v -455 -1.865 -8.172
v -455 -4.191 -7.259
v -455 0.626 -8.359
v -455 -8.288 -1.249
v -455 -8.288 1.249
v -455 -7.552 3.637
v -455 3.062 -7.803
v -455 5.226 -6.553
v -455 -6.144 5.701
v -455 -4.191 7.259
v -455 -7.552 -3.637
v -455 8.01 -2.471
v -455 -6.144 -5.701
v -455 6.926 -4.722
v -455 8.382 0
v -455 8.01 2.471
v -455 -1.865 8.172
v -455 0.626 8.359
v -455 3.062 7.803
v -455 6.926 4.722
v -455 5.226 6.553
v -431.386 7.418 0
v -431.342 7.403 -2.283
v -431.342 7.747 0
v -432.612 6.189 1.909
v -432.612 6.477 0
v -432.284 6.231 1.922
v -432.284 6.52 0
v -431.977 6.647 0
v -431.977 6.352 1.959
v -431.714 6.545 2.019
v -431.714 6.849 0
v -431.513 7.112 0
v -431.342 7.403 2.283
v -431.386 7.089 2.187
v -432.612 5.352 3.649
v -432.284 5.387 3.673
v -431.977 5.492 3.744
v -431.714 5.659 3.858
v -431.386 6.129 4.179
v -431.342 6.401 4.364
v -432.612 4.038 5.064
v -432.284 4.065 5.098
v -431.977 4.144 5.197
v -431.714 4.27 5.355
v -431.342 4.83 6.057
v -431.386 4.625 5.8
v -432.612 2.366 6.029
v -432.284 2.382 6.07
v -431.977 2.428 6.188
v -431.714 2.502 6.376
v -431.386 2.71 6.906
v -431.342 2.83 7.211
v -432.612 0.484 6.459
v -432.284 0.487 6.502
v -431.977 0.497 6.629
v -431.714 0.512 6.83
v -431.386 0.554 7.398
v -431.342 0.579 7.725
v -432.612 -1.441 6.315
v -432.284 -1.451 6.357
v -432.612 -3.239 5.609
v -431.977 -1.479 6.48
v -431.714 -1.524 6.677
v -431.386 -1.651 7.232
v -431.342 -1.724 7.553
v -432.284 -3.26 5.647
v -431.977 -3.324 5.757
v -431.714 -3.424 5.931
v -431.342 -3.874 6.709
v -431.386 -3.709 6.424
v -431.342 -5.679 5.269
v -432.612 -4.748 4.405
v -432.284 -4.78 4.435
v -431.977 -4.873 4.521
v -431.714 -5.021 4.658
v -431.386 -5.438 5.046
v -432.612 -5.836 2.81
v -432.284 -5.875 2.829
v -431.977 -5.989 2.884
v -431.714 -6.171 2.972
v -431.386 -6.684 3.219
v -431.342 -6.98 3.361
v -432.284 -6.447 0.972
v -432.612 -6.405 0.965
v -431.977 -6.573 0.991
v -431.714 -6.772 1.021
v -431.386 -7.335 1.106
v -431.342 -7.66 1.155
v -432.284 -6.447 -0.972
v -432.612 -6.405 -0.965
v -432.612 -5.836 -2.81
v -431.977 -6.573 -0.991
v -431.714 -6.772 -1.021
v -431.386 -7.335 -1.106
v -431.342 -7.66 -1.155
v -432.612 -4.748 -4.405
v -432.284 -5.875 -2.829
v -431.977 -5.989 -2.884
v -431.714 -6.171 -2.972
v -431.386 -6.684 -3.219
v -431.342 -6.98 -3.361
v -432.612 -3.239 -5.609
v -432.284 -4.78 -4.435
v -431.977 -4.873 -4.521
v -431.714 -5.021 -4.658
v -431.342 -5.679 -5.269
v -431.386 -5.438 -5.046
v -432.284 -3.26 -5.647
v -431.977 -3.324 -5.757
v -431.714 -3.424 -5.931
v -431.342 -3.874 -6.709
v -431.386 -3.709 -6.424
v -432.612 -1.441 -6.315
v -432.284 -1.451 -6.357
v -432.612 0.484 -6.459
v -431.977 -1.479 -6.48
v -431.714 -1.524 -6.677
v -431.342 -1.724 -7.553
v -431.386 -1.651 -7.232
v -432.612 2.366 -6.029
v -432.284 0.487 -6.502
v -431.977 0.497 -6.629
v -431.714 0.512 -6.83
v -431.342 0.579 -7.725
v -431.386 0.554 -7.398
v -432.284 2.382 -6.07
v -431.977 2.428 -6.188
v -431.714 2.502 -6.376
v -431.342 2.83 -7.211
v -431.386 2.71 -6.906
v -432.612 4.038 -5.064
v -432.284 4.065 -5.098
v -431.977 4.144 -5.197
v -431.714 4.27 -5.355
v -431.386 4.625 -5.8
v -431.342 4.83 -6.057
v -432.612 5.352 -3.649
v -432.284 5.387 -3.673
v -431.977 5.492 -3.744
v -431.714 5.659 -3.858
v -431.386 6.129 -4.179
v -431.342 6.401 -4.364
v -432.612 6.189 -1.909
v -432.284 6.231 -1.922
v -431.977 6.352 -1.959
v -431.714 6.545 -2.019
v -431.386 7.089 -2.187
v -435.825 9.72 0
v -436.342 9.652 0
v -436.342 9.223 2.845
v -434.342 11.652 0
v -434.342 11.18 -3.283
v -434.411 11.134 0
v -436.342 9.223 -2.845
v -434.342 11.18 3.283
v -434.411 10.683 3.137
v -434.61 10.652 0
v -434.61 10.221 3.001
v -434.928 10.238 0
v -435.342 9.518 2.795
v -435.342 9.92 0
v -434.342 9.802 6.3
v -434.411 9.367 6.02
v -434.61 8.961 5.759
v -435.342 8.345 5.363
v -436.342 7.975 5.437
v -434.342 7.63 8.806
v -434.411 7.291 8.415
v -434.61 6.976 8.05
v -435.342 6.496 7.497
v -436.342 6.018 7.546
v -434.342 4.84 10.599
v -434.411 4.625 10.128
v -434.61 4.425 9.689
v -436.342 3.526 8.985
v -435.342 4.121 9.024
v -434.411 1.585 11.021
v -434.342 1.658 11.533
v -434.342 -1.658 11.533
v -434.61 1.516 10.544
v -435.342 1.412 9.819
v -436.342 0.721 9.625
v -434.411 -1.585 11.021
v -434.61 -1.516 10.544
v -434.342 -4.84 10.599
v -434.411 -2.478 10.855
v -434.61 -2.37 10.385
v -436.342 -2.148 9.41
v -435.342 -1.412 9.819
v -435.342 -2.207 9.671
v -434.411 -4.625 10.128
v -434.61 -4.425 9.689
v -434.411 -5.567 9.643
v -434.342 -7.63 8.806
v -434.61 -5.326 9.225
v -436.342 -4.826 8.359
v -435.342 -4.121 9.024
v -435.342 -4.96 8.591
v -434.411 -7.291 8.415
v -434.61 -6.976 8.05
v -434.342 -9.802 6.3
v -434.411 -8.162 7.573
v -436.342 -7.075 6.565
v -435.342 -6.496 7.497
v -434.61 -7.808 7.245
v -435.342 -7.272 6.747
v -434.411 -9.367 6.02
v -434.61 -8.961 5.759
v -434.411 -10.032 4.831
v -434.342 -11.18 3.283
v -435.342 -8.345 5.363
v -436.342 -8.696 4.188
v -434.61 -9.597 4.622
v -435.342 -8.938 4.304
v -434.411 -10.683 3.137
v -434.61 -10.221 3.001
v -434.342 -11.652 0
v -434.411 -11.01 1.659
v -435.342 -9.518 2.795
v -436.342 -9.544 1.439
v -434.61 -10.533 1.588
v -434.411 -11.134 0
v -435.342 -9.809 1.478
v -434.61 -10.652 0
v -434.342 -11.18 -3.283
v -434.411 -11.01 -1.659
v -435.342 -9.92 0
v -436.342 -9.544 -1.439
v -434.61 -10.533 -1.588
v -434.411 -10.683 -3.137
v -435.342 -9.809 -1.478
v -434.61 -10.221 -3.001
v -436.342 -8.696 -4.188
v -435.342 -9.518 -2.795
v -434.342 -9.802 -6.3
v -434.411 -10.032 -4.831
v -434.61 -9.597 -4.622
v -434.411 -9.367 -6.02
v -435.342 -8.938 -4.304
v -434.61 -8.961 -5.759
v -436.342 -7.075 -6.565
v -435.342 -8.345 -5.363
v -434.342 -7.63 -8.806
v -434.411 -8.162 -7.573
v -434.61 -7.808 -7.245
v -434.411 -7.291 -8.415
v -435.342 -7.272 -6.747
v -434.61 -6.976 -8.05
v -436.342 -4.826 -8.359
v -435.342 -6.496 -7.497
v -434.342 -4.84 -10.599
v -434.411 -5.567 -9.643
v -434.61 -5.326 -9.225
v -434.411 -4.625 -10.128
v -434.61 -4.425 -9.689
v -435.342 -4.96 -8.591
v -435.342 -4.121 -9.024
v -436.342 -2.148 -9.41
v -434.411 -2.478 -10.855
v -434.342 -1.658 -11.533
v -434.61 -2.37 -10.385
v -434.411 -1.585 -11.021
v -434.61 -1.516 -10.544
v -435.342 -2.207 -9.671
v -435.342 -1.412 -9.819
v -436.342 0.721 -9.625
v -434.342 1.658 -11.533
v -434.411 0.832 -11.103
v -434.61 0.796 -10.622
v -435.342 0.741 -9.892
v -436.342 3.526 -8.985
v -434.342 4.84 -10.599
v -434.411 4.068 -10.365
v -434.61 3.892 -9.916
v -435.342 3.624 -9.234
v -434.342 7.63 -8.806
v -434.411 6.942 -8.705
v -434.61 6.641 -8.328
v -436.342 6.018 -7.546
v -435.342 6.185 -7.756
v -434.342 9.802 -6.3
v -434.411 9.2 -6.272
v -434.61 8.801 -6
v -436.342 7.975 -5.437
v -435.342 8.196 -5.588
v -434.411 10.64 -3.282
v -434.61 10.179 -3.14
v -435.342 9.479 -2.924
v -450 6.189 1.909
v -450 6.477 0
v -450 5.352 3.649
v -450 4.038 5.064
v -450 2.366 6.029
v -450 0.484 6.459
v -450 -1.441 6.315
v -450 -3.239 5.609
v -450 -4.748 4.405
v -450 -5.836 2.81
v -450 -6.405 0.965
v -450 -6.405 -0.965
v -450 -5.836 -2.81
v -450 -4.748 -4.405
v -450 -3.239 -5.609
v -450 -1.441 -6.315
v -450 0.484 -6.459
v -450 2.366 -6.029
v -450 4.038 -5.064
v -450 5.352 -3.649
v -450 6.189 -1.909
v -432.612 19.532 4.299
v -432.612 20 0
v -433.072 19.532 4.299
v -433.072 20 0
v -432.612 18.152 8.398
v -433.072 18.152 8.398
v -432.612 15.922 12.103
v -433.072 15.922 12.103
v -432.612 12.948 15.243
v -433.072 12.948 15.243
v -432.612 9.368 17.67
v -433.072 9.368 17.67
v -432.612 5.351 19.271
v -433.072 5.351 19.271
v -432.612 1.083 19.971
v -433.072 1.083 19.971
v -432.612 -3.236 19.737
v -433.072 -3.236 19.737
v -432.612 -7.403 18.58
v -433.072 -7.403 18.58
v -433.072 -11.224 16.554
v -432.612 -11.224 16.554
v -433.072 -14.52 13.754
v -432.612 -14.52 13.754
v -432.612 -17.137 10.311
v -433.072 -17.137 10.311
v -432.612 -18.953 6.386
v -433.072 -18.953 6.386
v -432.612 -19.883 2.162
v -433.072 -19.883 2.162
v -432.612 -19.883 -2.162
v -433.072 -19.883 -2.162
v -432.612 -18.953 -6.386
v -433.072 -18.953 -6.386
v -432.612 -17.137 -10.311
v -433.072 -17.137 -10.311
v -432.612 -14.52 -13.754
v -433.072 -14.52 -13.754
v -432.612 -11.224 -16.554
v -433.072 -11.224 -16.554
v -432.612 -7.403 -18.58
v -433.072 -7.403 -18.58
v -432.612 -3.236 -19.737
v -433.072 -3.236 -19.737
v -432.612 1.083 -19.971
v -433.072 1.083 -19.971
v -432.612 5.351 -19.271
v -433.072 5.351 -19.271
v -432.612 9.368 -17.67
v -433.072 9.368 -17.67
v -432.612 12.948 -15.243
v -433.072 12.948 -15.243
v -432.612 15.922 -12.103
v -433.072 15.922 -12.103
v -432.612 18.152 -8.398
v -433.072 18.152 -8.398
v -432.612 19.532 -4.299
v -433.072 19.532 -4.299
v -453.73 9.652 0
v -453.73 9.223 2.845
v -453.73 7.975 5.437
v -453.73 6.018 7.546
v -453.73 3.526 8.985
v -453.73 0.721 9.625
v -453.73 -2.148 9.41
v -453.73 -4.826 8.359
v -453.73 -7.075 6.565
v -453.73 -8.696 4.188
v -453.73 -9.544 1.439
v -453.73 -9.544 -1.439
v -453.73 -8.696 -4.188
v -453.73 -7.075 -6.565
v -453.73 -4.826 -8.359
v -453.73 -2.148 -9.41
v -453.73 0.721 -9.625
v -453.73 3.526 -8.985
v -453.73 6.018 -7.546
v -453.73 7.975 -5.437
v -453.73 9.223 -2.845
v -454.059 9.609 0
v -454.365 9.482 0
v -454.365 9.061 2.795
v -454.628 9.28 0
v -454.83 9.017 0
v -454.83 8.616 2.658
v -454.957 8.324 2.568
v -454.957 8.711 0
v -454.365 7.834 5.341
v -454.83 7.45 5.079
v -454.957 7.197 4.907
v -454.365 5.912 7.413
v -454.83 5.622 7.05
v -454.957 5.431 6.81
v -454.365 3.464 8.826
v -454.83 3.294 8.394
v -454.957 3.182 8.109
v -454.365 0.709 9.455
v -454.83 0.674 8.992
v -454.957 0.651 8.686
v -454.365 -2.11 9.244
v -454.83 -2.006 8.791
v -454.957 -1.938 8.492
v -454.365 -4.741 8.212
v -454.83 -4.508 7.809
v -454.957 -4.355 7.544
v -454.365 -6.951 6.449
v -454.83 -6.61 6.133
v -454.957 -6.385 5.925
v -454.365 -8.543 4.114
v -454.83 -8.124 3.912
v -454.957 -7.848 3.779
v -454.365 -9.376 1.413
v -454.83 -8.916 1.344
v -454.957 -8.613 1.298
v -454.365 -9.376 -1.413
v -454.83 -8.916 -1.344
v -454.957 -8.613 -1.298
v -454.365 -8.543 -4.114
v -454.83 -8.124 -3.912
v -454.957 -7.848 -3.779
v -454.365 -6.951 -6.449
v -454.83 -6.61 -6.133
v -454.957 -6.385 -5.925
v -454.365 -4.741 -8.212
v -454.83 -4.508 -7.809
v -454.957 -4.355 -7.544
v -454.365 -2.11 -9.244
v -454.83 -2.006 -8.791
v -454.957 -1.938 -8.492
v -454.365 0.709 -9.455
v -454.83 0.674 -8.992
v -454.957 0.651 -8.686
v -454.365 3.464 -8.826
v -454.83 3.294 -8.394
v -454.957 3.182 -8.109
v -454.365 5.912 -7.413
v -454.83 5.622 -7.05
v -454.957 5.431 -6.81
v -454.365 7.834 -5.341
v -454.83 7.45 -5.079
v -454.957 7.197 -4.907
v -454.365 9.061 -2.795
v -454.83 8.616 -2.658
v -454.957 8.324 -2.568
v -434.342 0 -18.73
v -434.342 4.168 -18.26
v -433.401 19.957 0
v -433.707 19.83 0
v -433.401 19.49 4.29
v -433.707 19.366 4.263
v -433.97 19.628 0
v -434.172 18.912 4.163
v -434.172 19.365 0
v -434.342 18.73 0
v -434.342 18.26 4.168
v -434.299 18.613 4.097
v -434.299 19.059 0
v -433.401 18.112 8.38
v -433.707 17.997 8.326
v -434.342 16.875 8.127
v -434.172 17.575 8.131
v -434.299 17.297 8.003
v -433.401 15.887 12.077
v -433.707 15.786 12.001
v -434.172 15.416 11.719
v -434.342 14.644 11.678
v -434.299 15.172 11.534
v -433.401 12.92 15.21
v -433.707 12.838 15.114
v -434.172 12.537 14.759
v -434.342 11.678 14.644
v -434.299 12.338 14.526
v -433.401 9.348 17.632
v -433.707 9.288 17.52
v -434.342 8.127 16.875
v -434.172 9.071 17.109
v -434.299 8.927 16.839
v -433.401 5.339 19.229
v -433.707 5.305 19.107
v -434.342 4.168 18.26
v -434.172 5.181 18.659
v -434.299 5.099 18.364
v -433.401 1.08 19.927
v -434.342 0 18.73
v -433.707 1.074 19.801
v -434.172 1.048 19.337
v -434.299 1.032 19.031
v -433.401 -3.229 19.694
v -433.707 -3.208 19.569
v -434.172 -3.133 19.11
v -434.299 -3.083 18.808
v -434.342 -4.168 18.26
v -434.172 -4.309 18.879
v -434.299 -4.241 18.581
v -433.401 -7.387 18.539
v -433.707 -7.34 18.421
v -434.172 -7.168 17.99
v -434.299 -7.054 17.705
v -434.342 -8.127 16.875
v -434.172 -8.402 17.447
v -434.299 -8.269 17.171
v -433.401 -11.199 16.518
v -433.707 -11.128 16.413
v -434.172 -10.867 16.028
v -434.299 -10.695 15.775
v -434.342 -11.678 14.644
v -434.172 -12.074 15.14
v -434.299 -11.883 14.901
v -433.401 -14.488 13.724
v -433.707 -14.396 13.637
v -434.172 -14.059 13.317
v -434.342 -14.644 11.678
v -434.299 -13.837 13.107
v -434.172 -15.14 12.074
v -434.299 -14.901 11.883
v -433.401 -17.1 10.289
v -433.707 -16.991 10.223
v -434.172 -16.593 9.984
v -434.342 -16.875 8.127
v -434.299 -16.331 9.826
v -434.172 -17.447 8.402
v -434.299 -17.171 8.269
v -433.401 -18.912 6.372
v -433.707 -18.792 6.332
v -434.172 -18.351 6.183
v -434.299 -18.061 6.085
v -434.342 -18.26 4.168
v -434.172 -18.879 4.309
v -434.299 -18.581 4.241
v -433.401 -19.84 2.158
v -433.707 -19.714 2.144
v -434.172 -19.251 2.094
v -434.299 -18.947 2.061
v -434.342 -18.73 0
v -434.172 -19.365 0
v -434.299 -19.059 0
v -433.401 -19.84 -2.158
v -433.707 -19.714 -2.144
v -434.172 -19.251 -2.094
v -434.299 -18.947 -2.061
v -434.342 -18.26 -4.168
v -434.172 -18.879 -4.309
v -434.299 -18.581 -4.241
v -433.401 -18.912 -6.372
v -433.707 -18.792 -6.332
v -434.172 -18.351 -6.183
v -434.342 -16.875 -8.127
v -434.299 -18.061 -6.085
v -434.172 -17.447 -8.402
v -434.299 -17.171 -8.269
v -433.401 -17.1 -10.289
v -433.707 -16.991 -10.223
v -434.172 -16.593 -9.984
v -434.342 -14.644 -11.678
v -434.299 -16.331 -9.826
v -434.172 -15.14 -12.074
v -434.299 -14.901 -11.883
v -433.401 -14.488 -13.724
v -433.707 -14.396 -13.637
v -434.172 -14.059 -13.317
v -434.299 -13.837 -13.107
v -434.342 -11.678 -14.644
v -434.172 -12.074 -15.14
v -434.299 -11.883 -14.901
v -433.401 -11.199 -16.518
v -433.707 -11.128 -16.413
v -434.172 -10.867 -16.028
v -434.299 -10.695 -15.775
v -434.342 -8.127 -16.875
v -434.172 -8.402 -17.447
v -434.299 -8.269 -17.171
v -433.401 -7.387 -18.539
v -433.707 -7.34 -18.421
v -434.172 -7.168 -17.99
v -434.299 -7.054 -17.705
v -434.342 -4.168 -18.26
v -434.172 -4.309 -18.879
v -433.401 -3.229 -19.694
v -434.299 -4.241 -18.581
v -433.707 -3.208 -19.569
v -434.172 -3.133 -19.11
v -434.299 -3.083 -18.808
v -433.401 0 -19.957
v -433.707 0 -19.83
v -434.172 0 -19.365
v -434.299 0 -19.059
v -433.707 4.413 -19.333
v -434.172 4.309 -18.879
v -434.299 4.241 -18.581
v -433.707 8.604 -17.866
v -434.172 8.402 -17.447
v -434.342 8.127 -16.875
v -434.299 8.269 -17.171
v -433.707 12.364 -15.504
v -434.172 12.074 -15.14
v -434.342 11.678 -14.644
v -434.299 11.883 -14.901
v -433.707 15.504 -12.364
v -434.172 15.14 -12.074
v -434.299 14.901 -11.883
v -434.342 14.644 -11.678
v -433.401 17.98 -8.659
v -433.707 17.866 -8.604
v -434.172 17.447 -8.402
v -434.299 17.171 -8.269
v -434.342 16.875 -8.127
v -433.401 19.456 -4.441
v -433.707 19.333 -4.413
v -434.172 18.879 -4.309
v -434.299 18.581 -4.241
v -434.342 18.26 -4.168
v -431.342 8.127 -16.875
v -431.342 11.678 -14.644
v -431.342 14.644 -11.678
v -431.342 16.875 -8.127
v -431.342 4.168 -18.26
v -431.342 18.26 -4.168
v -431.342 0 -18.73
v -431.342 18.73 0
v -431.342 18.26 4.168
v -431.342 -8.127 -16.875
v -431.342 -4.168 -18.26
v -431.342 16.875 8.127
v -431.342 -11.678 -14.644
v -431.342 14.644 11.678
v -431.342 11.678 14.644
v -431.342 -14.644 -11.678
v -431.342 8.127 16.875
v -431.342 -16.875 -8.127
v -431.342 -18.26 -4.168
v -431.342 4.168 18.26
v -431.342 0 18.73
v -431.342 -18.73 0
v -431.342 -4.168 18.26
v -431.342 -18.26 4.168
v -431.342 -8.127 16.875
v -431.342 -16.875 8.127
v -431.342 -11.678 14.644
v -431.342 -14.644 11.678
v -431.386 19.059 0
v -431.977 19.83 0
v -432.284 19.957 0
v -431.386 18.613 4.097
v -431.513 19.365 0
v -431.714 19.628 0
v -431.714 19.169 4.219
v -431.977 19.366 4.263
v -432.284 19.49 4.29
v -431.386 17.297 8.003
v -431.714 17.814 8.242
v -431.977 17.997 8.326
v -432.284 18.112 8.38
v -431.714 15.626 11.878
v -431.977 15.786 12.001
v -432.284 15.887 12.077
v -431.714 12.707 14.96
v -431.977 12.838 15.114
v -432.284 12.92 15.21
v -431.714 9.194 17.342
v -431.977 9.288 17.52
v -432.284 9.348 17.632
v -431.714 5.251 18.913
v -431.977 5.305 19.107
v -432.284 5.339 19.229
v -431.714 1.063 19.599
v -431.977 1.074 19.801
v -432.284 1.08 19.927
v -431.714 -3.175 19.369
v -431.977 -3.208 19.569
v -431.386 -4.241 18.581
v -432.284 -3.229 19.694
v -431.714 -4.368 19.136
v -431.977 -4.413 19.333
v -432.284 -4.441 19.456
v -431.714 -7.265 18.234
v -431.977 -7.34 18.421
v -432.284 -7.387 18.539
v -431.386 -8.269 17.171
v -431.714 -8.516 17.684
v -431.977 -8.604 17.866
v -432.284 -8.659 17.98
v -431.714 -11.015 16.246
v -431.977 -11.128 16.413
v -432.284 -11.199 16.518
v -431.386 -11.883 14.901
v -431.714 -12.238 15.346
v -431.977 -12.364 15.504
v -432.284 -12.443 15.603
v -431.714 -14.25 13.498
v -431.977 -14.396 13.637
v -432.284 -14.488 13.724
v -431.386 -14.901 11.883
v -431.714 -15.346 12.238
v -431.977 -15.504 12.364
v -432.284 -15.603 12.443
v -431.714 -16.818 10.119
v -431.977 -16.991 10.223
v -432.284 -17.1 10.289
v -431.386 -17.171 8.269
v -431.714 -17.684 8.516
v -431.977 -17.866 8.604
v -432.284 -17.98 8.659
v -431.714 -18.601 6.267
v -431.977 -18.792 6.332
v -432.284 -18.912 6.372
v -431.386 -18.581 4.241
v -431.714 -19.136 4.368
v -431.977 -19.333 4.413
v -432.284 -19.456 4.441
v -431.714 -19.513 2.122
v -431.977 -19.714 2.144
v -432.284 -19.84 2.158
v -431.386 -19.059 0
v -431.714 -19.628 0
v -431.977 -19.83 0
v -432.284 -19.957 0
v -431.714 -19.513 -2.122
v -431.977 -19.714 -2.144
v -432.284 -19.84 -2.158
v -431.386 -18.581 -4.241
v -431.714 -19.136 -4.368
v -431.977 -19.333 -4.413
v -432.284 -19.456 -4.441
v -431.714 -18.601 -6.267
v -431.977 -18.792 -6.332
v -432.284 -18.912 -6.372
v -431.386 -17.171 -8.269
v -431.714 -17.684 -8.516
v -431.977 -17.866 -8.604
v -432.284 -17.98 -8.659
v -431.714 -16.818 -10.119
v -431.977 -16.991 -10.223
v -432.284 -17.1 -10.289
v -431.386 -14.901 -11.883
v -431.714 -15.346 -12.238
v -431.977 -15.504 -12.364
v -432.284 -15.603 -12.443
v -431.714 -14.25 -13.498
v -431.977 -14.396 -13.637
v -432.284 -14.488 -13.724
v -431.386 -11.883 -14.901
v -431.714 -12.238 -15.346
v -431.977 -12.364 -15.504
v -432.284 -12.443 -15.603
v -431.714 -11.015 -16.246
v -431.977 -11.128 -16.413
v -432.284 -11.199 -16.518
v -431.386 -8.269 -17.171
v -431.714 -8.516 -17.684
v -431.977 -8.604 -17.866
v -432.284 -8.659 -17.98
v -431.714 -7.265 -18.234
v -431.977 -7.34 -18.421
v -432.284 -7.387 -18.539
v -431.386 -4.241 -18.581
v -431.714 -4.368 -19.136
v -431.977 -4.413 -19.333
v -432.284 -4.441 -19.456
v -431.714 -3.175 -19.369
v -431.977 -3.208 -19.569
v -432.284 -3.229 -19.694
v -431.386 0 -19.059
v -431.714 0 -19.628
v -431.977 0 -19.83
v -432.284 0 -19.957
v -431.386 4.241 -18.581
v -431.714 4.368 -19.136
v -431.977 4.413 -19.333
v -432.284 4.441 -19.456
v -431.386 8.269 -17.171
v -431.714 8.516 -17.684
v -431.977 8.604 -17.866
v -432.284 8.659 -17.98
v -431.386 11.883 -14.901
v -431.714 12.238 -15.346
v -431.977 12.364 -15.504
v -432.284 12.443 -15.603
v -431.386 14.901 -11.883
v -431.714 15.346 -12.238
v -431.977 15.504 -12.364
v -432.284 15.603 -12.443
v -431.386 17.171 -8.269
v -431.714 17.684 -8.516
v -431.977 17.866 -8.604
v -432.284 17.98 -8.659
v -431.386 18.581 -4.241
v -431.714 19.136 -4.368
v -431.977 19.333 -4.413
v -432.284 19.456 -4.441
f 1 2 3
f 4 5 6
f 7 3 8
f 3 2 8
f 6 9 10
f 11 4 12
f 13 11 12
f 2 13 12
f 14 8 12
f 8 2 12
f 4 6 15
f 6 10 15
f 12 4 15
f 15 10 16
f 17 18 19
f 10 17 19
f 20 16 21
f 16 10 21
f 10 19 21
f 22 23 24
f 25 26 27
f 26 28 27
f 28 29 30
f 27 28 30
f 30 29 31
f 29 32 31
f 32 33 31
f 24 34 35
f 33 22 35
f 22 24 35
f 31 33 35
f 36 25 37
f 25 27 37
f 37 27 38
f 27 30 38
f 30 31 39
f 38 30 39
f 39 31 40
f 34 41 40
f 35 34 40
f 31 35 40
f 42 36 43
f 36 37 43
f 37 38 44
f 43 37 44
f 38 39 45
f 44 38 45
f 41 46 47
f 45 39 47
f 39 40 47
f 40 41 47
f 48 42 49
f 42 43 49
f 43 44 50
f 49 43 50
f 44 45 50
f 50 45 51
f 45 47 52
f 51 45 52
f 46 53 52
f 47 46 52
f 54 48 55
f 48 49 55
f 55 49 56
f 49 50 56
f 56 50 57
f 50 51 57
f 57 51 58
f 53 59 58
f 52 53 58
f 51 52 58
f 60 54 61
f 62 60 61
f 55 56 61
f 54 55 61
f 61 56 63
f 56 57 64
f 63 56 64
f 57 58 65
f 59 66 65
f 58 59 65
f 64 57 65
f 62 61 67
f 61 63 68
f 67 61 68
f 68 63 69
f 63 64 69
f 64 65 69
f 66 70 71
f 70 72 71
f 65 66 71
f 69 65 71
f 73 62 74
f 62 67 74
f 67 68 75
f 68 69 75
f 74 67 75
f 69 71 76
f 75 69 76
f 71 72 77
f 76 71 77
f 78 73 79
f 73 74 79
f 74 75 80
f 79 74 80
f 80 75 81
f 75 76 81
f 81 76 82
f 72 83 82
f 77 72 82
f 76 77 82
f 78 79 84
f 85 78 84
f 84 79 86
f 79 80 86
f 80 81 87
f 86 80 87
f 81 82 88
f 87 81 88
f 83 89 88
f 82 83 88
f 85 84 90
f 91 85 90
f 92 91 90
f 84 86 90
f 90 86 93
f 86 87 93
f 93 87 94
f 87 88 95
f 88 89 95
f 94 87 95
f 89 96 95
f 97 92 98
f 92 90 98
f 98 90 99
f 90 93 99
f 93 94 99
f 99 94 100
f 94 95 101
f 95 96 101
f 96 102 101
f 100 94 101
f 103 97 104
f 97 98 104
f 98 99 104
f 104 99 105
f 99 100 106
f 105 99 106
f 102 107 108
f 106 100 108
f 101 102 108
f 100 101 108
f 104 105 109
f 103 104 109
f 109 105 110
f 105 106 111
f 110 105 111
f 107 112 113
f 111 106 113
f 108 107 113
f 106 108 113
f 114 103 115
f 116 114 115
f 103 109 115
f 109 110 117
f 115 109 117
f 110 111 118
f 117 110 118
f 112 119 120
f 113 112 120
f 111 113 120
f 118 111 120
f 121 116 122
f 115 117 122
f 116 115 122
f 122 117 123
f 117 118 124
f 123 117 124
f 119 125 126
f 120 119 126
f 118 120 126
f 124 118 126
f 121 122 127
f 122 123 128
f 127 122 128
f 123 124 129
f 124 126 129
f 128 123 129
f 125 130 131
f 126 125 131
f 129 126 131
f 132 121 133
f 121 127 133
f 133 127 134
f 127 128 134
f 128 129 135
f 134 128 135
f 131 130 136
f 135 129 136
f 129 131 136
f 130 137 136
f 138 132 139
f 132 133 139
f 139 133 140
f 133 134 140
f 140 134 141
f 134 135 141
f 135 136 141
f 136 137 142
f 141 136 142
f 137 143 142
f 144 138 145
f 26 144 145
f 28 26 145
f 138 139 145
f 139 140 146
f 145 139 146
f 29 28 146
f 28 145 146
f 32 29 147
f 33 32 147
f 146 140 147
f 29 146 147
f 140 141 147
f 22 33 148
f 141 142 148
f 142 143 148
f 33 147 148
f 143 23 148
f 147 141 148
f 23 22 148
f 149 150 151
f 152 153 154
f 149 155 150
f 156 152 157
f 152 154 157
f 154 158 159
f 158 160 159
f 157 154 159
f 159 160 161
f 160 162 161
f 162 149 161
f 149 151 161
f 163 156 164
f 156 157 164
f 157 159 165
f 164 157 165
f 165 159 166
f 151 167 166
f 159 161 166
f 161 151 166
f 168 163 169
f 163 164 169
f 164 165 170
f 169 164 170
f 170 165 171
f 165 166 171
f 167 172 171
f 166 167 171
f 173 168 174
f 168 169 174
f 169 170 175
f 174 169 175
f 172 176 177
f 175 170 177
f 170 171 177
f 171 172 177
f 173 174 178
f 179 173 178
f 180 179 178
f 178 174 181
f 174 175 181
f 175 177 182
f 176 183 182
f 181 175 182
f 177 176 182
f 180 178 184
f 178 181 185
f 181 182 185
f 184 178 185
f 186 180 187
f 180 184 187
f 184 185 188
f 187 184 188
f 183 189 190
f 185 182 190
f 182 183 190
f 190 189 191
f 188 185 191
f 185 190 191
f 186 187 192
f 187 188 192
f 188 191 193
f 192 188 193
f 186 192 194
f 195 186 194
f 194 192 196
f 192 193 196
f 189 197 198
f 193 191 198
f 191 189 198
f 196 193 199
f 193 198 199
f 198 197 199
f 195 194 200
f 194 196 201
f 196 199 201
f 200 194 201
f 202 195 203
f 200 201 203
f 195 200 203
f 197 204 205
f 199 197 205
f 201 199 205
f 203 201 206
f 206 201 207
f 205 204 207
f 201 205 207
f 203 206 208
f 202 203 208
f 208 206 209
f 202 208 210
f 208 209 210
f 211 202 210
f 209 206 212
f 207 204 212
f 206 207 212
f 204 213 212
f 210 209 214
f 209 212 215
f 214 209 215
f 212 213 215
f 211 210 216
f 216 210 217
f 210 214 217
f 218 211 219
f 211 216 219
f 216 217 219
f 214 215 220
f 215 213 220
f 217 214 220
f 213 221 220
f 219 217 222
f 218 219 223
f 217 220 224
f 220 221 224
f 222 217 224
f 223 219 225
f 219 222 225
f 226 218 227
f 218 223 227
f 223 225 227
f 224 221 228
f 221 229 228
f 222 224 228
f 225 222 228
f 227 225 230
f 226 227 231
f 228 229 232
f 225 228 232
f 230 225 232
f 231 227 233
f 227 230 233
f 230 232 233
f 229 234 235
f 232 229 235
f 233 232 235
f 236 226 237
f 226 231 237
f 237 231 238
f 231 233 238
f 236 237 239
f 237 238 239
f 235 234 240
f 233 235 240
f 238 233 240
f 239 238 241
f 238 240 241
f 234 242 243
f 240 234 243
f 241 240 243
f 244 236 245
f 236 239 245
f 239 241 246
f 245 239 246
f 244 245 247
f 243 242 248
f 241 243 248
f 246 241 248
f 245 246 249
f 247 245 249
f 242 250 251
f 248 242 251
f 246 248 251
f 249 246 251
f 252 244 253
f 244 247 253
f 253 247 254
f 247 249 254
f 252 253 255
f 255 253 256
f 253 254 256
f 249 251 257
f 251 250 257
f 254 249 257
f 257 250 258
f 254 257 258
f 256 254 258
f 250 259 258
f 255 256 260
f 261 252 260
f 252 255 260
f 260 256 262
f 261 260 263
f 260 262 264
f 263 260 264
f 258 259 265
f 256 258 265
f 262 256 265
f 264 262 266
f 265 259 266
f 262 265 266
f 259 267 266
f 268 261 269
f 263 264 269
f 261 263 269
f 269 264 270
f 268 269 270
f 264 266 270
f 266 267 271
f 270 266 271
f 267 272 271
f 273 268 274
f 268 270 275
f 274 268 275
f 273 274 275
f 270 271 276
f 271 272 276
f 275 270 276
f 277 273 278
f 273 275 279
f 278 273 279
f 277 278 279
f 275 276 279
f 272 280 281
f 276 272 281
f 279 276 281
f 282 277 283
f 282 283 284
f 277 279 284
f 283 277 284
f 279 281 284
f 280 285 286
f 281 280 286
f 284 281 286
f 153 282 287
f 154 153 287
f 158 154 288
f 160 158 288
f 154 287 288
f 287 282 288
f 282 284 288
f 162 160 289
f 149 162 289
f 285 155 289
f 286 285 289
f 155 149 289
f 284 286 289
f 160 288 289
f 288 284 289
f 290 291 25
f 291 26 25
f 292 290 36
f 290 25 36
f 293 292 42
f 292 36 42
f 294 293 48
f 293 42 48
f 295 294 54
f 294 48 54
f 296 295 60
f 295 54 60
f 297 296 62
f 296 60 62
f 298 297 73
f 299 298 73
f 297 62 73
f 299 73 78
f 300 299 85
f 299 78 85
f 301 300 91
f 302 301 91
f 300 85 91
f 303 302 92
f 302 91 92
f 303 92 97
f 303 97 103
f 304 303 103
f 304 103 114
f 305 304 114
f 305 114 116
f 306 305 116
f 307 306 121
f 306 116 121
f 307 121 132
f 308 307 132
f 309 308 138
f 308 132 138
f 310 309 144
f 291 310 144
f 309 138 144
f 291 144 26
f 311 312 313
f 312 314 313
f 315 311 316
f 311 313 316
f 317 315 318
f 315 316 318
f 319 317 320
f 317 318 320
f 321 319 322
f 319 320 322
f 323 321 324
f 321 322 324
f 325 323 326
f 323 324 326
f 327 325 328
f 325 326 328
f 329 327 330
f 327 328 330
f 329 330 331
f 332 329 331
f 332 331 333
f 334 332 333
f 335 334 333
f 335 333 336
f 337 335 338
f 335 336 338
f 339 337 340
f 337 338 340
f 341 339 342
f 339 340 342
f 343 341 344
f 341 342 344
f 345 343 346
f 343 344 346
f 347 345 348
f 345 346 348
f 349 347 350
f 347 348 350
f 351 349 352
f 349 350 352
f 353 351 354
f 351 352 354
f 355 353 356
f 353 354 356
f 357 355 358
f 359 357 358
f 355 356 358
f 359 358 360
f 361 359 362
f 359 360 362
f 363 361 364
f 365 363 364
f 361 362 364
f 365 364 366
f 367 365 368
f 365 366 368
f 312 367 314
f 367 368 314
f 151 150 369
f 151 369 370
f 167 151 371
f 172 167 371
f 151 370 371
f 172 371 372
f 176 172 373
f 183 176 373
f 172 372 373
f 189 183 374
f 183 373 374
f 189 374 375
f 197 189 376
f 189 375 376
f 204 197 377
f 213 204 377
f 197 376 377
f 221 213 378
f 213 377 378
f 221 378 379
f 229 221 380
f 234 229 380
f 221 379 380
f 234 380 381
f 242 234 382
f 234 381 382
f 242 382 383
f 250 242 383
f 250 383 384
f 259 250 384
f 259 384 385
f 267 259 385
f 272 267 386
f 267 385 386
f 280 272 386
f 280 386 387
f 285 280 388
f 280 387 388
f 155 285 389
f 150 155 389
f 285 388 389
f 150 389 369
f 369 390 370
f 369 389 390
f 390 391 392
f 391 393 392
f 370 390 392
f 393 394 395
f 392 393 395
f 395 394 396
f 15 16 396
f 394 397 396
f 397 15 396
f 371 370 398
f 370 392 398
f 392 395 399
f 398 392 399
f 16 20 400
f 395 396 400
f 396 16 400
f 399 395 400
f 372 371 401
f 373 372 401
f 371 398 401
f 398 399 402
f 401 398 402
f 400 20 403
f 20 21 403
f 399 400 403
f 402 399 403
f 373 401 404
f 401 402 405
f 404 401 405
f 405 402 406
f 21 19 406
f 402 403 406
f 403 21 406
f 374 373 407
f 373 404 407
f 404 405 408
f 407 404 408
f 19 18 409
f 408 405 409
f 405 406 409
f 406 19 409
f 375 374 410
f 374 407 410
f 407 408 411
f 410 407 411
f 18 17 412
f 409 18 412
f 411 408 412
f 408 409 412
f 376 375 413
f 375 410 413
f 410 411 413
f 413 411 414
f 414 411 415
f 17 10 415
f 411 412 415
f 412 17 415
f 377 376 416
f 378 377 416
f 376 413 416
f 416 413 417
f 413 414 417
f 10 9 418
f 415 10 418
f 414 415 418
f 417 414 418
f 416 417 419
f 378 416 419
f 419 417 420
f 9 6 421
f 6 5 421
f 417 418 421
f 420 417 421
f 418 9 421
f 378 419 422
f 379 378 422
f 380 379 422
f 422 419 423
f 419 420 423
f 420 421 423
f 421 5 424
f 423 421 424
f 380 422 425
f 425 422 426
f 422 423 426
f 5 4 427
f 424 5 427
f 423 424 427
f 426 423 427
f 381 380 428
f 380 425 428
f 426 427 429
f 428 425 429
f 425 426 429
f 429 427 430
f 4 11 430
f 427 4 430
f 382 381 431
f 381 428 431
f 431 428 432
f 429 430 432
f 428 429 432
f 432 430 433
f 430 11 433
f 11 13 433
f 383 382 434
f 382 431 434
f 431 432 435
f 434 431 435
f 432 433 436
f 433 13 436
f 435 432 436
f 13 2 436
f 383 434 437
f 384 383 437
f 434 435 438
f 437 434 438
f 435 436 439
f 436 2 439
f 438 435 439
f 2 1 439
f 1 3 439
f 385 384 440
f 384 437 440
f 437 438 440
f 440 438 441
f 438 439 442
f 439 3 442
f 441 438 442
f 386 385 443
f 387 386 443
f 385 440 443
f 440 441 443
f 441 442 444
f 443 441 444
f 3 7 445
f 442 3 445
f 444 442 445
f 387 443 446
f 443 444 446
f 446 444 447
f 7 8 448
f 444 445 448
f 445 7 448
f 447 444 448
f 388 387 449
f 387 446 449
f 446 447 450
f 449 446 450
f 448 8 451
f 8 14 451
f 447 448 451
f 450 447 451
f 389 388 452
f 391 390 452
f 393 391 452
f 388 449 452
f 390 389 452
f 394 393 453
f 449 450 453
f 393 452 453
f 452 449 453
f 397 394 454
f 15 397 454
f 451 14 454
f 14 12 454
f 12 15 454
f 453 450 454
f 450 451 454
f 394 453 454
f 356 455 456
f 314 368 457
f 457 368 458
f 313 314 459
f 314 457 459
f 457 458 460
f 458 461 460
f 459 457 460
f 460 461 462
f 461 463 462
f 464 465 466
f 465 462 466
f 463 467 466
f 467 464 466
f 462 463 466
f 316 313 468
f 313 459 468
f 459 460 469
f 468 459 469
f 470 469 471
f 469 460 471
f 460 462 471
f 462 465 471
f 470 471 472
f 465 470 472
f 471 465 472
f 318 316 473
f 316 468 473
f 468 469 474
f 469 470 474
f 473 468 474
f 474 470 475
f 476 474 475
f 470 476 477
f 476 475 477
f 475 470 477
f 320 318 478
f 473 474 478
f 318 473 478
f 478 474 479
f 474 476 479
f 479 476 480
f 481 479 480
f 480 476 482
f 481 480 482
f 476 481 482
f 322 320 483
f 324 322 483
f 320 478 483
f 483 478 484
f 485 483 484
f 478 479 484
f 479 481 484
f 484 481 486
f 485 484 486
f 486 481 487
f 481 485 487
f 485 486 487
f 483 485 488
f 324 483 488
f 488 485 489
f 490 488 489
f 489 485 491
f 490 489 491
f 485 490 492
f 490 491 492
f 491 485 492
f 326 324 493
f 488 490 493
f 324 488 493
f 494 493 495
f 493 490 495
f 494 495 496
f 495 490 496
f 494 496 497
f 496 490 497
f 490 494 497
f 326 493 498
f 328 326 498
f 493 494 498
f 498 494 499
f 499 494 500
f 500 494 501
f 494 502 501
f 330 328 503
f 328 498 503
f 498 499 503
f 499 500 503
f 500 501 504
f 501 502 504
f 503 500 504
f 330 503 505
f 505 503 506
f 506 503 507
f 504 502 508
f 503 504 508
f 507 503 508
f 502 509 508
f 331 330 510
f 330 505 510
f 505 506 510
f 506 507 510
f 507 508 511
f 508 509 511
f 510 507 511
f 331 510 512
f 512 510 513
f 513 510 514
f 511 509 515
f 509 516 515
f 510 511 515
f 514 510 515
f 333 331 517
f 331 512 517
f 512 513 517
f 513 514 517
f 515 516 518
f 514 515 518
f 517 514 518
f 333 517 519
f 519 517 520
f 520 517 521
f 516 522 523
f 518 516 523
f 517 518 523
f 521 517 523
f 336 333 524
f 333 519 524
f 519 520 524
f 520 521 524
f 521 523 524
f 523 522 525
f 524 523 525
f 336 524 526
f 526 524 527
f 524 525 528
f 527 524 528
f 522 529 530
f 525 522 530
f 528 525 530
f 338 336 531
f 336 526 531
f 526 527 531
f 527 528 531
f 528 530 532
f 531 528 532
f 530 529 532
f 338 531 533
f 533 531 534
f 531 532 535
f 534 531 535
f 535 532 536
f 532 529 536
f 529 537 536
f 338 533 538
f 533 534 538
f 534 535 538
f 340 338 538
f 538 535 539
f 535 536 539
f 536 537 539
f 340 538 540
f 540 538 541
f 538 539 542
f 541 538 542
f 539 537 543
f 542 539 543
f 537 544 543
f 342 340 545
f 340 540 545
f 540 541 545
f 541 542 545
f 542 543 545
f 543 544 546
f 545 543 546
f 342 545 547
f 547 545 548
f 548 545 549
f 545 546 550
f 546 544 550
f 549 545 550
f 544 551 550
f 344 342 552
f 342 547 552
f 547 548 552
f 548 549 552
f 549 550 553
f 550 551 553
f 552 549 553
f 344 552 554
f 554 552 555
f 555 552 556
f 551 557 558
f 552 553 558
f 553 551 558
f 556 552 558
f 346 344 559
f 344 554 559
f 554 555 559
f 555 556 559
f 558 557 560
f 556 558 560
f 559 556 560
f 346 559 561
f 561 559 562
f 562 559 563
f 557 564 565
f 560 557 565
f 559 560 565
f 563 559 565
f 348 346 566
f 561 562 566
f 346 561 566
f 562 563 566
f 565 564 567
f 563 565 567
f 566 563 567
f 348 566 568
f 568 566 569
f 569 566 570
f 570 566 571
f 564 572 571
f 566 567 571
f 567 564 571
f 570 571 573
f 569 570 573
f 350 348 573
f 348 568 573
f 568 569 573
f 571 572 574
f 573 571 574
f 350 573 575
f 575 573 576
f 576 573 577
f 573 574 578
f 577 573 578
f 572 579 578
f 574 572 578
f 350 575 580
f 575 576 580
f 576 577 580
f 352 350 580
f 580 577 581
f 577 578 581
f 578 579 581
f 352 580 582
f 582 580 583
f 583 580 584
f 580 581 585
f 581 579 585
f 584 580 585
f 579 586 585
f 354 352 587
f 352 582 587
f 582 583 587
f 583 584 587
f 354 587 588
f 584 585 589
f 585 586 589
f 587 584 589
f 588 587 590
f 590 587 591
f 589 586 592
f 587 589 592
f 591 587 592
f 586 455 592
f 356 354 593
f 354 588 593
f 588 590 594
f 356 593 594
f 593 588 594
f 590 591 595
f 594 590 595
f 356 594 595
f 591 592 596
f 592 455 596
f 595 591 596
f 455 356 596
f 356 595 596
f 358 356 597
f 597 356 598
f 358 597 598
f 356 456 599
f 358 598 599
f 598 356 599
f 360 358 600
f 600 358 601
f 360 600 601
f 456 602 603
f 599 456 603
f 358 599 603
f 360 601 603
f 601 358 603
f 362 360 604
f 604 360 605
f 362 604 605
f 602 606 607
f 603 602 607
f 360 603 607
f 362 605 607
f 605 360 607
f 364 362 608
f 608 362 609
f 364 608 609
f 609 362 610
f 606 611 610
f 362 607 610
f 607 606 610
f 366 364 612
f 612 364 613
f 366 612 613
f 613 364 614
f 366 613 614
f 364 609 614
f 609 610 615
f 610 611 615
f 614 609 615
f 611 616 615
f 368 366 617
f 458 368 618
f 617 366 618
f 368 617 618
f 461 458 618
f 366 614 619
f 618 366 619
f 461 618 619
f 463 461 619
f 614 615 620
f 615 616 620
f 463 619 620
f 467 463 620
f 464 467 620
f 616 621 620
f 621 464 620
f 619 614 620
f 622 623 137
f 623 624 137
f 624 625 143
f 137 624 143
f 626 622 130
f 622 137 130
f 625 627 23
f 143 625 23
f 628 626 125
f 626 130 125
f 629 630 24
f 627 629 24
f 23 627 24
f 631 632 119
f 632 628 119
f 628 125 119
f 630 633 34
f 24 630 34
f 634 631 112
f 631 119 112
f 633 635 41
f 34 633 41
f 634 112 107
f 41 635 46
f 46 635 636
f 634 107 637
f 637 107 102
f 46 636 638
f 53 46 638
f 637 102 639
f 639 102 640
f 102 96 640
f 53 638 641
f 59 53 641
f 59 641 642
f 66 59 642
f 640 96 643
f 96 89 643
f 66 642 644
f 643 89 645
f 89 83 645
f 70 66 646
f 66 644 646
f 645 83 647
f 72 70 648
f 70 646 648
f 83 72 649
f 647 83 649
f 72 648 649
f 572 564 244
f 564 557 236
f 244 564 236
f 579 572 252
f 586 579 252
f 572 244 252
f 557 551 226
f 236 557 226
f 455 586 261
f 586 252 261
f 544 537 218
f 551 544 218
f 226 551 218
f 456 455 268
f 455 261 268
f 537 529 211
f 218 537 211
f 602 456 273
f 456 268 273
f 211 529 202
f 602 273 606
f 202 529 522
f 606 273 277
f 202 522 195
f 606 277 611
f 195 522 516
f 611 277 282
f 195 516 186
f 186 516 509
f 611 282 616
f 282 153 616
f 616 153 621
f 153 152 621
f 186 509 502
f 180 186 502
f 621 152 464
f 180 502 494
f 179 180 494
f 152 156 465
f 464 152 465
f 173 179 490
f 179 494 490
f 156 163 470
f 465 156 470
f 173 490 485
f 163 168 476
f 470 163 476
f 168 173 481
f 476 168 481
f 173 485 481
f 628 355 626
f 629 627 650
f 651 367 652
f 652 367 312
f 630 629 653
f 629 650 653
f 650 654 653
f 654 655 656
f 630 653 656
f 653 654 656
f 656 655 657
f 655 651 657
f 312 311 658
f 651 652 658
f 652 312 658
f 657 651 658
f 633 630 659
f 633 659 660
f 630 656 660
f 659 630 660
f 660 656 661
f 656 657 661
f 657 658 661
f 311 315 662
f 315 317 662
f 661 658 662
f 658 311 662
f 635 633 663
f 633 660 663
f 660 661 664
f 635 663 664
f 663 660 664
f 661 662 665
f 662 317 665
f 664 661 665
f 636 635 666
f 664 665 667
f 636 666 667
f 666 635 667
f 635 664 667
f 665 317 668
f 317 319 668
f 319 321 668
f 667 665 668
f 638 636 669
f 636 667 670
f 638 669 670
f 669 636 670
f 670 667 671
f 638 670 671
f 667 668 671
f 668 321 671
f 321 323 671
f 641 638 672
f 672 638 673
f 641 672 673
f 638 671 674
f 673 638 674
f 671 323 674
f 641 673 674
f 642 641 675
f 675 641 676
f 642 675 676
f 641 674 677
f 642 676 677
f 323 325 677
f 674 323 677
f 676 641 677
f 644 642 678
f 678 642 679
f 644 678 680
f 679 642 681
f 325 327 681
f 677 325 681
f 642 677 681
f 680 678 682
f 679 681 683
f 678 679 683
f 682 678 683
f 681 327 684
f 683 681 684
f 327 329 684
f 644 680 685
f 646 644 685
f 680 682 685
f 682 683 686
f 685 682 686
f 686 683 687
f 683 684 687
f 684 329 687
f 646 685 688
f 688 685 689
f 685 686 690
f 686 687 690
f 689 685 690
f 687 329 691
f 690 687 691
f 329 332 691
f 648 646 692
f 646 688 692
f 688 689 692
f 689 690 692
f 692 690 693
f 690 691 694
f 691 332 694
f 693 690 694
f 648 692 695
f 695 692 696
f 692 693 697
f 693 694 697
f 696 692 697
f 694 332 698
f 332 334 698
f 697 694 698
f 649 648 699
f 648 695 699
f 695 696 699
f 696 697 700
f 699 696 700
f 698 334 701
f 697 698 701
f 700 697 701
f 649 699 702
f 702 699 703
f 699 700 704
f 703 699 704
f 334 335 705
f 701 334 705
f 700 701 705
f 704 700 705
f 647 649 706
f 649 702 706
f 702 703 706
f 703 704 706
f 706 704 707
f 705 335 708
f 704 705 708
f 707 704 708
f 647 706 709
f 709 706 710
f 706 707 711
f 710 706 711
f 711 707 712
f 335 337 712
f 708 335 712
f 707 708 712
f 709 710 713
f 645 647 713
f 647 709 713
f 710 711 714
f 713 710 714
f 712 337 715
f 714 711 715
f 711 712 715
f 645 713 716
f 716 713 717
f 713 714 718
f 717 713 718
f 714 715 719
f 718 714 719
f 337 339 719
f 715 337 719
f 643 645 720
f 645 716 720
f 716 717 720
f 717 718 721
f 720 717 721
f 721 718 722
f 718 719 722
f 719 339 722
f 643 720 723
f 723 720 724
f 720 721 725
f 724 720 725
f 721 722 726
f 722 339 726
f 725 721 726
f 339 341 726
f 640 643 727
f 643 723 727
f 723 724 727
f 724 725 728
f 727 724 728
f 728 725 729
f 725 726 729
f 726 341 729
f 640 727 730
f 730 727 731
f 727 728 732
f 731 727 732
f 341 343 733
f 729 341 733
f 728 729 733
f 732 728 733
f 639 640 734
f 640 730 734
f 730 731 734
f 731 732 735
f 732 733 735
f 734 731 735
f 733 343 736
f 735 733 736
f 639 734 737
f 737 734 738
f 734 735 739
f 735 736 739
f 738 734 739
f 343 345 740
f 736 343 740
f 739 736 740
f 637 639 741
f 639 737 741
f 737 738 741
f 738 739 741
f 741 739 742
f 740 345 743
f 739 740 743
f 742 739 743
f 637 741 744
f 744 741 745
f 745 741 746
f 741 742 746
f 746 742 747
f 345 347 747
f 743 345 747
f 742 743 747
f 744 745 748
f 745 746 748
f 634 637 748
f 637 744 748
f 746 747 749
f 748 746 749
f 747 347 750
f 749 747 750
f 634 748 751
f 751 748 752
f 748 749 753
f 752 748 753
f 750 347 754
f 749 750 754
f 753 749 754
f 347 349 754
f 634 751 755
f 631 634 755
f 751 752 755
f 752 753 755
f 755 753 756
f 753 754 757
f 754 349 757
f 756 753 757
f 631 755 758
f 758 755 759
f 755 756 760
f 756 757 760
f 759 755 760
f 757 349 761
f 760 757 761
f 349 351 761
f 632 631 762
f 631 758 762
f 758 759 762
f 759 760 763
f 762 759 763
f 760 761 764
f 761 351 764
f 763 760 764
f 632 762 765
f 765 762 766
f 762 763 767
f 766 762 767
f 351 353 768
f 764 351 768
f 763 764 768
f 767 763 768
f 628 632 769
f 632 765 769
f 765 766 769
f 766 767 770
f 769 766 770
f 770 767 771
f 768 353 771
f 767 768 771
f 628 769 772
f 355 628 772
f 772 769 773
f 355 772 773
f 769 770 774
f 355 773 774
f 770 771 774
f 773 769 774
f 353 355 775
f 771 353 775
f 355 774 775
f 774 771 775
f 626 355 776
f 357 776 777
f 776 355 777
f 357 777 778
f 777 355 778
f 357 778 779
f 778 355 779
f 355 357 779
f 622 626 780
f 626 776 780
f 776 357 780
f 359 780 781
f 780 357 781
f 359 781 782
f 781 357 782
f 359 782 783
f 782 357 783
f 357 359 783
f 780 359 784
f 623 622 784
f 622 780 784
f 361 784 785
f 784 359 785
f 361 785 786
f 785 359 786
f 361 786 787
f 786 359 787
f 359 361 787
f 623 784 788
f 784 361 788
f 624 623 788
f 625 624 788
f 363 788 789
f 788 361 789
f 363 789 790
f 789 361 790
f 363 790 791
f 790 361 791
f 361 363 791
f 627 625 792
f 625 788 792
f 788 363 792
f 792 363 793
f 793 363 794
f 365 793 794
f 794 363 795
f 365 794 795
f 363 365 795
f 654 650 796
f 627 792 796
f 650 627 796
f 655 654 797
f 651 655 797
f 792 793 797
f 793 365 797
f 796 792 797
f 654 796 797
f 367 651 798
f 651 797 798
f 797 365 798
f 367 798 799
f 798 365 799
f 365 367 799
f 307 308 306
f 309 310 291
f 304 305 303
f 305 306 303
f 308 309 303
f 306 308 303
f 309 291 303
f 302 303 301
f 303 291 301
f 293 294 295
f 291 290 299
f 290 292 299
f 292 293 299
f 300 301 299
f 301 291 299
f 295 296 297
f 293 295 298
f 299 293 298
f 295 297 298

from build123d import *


with BuildPart() as part:
    # 草图1 → 旋转1 (revolve)
    with BuildSketch(Plane.XY):
        with BuildLine():
            Line((-455, 8.382), (-455, 0))
            Line((-455, 0), (-450, 0))
            Line((-450, 0), (-450, 6.477))
            Line((-450, 6.477), (-432.612413979, 6.477))
            ThreePointArc((-432.612413979, 6.477), (-431.714388367, 6.848974388), (-431.342413979, 7.747))
            Line((-431.342413979, 7.747), (-431.342413979, 18.73))
            ThreePointArc((-431.342413979, 18.73), (-431.714388367, 19.628025612), (-432.612413979, 20))
            Line((-432.612413979, 20), (-433.072413979, 20))
            ThreePointArc((-433.072413979, 20), (-433.970439591, 19.628025612), (-434.342413979, 18.73))
            Line((-434.342413979, 18.73), (-434.342413979, 11.652))
            ThreePointArc((-434.342413979, 11.652), (-434.928200417, 10.237786438), (-436.342413979, 9.652))
            Line((-436.342413979, 9.652), (-453.73, 9.652))
            ThreePointArc((-453.73, 9.652), (-454.628025612, 9.280025612), (-455, 8.382))
        make_face()
    revolve(axis=Axis((-455.001250002, 0, 0), (1, 0, 0)))


solid = part.part
